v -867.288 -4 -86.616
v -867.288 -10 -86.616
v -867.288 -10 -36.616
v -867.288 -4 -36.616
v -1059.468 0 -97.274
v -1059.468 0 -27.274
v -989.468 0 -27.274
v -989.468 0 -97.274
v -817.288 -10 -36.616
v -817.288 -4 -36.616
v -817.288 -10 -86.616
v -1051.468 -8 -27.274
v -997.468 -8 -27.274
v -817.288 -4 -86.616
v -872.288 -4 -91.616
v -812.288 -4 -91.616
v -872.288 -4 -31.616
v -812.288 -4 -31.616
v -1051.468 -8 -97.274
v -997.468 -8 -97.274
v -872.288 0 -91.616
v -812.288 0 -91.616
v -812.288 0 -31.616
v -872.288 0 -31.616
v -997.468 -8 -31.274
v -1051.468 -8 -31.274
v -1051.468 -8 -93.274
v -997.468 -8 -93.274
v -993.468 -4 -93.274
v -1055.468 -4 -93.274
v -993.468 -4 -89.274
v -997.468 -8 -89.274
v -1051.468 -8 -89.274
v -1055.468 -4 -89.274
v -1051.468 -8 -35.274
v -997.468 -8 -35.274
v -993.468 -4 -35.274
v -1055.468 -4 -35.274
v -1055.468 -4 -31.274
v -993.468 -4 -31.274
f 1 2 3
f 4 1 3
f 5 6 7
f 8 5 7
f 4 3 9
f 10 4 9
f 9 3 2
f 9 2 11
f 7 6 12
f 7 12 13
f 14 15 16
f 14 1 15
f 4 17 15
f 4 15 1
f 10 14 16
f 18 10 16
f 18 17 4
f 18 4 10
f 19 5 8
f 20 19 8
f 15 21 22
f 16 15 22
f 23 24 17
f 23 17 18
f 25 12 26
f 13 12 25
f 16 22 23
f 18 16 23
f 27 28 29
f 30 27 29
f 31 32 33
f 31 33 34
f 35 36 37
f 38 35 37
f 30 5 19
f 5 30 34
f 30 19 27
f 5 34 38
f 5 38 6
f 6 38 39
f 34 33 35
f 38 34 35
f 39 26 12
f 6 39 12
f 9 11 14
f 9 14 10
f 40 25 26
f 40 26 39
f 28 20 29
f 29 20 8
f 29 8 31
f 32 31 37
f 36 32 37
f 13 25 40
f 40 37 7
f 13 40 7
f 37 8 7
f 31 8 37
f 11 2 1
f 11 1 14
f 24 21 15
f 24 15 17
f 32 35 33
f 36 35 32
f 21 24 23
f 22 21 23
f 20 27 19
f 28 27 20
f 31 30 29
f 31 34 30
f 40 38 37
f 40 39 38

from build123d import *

# Parameters (mm, degrees)
F0_W     = 70
F0_H     = 70
F1_DEPTH = 8
F2_W     = 70
F2_H     = 4
F3_DEPTH = 4
F4_SIZE  = 7.99999
F5_W     = 60
F5_H     = 60
F6_DEPTH = 10
F7_W     = 60
F7_H     = 60
F7_W_2   = 50
F7_H_2   = 50
F8_DEPTH = 6


# Not quite as in the source:
# - a fillet or chamfer is up to 0.001 mm smaller than in the source, because OpenCascade refuses the exact size


with BuildPart() as f1:
    # F0 (on Front) → F1 (new body)
    with BuildSketch(Plane.XZ):
        with Locations((-1024.4680345058, -62.2741735576)):
            Rectangle(F0_W, F0_H)
    extrude(amount=F1_DEPTH)

    # F2 (on face) → F3 (cut)
    with BuildSketch(Plane.XZ.offset(8)):
        with Locations((-1024.4680345058, -33.2741735576)):
            Rectangle(F2_W, F2_H)
        with Locations((-1024.4680345058, -91.2741735576)):
            Rectangle(F2_W, F2_H)
    extrude(amount=-F3_DEPTH, mode=Mode.SUBTRACT)

    # F4 (size 8 in the source; OpenCascade refuses exactly that, so slightly less here)
    f4_edges = [f1.edges().sort_by_distance(p)[0] for p in [
        (-989.468035, -8, -62.274174),
        (-1059.468035, -8, -62.274174),
    ]]
    chamfer(f4_edges, length=F4_SIZE)


with BuildPart() as f6:
    # F5 (on Front) → F6 (new body)
    with BuildSketch(Plane.XZ):
        with Locations((-842.2881662846, -61.6157978558)):
            Rectangle(F5_W, F5_H)
    extrude(amount=F6_DEPTH)

    # F7 (on face) → F8 (cut)
    with BuildSketch(Plane.XZ.offset(10)):
        with Locations((-842.2881662846, -61.6157978558)):
            Rectangle(F7_W, F7_H)
        with Locations((-842.2881662846, -61.6157978558)):
            Rectangle(F7_W_2, F7_H_2, mode=Mode.SUBTRACT)
    extrude(amount=-F8_DEPTH, mode=Mode.SUBTRACT)


solid = Compound([f1.part, f6.part])
